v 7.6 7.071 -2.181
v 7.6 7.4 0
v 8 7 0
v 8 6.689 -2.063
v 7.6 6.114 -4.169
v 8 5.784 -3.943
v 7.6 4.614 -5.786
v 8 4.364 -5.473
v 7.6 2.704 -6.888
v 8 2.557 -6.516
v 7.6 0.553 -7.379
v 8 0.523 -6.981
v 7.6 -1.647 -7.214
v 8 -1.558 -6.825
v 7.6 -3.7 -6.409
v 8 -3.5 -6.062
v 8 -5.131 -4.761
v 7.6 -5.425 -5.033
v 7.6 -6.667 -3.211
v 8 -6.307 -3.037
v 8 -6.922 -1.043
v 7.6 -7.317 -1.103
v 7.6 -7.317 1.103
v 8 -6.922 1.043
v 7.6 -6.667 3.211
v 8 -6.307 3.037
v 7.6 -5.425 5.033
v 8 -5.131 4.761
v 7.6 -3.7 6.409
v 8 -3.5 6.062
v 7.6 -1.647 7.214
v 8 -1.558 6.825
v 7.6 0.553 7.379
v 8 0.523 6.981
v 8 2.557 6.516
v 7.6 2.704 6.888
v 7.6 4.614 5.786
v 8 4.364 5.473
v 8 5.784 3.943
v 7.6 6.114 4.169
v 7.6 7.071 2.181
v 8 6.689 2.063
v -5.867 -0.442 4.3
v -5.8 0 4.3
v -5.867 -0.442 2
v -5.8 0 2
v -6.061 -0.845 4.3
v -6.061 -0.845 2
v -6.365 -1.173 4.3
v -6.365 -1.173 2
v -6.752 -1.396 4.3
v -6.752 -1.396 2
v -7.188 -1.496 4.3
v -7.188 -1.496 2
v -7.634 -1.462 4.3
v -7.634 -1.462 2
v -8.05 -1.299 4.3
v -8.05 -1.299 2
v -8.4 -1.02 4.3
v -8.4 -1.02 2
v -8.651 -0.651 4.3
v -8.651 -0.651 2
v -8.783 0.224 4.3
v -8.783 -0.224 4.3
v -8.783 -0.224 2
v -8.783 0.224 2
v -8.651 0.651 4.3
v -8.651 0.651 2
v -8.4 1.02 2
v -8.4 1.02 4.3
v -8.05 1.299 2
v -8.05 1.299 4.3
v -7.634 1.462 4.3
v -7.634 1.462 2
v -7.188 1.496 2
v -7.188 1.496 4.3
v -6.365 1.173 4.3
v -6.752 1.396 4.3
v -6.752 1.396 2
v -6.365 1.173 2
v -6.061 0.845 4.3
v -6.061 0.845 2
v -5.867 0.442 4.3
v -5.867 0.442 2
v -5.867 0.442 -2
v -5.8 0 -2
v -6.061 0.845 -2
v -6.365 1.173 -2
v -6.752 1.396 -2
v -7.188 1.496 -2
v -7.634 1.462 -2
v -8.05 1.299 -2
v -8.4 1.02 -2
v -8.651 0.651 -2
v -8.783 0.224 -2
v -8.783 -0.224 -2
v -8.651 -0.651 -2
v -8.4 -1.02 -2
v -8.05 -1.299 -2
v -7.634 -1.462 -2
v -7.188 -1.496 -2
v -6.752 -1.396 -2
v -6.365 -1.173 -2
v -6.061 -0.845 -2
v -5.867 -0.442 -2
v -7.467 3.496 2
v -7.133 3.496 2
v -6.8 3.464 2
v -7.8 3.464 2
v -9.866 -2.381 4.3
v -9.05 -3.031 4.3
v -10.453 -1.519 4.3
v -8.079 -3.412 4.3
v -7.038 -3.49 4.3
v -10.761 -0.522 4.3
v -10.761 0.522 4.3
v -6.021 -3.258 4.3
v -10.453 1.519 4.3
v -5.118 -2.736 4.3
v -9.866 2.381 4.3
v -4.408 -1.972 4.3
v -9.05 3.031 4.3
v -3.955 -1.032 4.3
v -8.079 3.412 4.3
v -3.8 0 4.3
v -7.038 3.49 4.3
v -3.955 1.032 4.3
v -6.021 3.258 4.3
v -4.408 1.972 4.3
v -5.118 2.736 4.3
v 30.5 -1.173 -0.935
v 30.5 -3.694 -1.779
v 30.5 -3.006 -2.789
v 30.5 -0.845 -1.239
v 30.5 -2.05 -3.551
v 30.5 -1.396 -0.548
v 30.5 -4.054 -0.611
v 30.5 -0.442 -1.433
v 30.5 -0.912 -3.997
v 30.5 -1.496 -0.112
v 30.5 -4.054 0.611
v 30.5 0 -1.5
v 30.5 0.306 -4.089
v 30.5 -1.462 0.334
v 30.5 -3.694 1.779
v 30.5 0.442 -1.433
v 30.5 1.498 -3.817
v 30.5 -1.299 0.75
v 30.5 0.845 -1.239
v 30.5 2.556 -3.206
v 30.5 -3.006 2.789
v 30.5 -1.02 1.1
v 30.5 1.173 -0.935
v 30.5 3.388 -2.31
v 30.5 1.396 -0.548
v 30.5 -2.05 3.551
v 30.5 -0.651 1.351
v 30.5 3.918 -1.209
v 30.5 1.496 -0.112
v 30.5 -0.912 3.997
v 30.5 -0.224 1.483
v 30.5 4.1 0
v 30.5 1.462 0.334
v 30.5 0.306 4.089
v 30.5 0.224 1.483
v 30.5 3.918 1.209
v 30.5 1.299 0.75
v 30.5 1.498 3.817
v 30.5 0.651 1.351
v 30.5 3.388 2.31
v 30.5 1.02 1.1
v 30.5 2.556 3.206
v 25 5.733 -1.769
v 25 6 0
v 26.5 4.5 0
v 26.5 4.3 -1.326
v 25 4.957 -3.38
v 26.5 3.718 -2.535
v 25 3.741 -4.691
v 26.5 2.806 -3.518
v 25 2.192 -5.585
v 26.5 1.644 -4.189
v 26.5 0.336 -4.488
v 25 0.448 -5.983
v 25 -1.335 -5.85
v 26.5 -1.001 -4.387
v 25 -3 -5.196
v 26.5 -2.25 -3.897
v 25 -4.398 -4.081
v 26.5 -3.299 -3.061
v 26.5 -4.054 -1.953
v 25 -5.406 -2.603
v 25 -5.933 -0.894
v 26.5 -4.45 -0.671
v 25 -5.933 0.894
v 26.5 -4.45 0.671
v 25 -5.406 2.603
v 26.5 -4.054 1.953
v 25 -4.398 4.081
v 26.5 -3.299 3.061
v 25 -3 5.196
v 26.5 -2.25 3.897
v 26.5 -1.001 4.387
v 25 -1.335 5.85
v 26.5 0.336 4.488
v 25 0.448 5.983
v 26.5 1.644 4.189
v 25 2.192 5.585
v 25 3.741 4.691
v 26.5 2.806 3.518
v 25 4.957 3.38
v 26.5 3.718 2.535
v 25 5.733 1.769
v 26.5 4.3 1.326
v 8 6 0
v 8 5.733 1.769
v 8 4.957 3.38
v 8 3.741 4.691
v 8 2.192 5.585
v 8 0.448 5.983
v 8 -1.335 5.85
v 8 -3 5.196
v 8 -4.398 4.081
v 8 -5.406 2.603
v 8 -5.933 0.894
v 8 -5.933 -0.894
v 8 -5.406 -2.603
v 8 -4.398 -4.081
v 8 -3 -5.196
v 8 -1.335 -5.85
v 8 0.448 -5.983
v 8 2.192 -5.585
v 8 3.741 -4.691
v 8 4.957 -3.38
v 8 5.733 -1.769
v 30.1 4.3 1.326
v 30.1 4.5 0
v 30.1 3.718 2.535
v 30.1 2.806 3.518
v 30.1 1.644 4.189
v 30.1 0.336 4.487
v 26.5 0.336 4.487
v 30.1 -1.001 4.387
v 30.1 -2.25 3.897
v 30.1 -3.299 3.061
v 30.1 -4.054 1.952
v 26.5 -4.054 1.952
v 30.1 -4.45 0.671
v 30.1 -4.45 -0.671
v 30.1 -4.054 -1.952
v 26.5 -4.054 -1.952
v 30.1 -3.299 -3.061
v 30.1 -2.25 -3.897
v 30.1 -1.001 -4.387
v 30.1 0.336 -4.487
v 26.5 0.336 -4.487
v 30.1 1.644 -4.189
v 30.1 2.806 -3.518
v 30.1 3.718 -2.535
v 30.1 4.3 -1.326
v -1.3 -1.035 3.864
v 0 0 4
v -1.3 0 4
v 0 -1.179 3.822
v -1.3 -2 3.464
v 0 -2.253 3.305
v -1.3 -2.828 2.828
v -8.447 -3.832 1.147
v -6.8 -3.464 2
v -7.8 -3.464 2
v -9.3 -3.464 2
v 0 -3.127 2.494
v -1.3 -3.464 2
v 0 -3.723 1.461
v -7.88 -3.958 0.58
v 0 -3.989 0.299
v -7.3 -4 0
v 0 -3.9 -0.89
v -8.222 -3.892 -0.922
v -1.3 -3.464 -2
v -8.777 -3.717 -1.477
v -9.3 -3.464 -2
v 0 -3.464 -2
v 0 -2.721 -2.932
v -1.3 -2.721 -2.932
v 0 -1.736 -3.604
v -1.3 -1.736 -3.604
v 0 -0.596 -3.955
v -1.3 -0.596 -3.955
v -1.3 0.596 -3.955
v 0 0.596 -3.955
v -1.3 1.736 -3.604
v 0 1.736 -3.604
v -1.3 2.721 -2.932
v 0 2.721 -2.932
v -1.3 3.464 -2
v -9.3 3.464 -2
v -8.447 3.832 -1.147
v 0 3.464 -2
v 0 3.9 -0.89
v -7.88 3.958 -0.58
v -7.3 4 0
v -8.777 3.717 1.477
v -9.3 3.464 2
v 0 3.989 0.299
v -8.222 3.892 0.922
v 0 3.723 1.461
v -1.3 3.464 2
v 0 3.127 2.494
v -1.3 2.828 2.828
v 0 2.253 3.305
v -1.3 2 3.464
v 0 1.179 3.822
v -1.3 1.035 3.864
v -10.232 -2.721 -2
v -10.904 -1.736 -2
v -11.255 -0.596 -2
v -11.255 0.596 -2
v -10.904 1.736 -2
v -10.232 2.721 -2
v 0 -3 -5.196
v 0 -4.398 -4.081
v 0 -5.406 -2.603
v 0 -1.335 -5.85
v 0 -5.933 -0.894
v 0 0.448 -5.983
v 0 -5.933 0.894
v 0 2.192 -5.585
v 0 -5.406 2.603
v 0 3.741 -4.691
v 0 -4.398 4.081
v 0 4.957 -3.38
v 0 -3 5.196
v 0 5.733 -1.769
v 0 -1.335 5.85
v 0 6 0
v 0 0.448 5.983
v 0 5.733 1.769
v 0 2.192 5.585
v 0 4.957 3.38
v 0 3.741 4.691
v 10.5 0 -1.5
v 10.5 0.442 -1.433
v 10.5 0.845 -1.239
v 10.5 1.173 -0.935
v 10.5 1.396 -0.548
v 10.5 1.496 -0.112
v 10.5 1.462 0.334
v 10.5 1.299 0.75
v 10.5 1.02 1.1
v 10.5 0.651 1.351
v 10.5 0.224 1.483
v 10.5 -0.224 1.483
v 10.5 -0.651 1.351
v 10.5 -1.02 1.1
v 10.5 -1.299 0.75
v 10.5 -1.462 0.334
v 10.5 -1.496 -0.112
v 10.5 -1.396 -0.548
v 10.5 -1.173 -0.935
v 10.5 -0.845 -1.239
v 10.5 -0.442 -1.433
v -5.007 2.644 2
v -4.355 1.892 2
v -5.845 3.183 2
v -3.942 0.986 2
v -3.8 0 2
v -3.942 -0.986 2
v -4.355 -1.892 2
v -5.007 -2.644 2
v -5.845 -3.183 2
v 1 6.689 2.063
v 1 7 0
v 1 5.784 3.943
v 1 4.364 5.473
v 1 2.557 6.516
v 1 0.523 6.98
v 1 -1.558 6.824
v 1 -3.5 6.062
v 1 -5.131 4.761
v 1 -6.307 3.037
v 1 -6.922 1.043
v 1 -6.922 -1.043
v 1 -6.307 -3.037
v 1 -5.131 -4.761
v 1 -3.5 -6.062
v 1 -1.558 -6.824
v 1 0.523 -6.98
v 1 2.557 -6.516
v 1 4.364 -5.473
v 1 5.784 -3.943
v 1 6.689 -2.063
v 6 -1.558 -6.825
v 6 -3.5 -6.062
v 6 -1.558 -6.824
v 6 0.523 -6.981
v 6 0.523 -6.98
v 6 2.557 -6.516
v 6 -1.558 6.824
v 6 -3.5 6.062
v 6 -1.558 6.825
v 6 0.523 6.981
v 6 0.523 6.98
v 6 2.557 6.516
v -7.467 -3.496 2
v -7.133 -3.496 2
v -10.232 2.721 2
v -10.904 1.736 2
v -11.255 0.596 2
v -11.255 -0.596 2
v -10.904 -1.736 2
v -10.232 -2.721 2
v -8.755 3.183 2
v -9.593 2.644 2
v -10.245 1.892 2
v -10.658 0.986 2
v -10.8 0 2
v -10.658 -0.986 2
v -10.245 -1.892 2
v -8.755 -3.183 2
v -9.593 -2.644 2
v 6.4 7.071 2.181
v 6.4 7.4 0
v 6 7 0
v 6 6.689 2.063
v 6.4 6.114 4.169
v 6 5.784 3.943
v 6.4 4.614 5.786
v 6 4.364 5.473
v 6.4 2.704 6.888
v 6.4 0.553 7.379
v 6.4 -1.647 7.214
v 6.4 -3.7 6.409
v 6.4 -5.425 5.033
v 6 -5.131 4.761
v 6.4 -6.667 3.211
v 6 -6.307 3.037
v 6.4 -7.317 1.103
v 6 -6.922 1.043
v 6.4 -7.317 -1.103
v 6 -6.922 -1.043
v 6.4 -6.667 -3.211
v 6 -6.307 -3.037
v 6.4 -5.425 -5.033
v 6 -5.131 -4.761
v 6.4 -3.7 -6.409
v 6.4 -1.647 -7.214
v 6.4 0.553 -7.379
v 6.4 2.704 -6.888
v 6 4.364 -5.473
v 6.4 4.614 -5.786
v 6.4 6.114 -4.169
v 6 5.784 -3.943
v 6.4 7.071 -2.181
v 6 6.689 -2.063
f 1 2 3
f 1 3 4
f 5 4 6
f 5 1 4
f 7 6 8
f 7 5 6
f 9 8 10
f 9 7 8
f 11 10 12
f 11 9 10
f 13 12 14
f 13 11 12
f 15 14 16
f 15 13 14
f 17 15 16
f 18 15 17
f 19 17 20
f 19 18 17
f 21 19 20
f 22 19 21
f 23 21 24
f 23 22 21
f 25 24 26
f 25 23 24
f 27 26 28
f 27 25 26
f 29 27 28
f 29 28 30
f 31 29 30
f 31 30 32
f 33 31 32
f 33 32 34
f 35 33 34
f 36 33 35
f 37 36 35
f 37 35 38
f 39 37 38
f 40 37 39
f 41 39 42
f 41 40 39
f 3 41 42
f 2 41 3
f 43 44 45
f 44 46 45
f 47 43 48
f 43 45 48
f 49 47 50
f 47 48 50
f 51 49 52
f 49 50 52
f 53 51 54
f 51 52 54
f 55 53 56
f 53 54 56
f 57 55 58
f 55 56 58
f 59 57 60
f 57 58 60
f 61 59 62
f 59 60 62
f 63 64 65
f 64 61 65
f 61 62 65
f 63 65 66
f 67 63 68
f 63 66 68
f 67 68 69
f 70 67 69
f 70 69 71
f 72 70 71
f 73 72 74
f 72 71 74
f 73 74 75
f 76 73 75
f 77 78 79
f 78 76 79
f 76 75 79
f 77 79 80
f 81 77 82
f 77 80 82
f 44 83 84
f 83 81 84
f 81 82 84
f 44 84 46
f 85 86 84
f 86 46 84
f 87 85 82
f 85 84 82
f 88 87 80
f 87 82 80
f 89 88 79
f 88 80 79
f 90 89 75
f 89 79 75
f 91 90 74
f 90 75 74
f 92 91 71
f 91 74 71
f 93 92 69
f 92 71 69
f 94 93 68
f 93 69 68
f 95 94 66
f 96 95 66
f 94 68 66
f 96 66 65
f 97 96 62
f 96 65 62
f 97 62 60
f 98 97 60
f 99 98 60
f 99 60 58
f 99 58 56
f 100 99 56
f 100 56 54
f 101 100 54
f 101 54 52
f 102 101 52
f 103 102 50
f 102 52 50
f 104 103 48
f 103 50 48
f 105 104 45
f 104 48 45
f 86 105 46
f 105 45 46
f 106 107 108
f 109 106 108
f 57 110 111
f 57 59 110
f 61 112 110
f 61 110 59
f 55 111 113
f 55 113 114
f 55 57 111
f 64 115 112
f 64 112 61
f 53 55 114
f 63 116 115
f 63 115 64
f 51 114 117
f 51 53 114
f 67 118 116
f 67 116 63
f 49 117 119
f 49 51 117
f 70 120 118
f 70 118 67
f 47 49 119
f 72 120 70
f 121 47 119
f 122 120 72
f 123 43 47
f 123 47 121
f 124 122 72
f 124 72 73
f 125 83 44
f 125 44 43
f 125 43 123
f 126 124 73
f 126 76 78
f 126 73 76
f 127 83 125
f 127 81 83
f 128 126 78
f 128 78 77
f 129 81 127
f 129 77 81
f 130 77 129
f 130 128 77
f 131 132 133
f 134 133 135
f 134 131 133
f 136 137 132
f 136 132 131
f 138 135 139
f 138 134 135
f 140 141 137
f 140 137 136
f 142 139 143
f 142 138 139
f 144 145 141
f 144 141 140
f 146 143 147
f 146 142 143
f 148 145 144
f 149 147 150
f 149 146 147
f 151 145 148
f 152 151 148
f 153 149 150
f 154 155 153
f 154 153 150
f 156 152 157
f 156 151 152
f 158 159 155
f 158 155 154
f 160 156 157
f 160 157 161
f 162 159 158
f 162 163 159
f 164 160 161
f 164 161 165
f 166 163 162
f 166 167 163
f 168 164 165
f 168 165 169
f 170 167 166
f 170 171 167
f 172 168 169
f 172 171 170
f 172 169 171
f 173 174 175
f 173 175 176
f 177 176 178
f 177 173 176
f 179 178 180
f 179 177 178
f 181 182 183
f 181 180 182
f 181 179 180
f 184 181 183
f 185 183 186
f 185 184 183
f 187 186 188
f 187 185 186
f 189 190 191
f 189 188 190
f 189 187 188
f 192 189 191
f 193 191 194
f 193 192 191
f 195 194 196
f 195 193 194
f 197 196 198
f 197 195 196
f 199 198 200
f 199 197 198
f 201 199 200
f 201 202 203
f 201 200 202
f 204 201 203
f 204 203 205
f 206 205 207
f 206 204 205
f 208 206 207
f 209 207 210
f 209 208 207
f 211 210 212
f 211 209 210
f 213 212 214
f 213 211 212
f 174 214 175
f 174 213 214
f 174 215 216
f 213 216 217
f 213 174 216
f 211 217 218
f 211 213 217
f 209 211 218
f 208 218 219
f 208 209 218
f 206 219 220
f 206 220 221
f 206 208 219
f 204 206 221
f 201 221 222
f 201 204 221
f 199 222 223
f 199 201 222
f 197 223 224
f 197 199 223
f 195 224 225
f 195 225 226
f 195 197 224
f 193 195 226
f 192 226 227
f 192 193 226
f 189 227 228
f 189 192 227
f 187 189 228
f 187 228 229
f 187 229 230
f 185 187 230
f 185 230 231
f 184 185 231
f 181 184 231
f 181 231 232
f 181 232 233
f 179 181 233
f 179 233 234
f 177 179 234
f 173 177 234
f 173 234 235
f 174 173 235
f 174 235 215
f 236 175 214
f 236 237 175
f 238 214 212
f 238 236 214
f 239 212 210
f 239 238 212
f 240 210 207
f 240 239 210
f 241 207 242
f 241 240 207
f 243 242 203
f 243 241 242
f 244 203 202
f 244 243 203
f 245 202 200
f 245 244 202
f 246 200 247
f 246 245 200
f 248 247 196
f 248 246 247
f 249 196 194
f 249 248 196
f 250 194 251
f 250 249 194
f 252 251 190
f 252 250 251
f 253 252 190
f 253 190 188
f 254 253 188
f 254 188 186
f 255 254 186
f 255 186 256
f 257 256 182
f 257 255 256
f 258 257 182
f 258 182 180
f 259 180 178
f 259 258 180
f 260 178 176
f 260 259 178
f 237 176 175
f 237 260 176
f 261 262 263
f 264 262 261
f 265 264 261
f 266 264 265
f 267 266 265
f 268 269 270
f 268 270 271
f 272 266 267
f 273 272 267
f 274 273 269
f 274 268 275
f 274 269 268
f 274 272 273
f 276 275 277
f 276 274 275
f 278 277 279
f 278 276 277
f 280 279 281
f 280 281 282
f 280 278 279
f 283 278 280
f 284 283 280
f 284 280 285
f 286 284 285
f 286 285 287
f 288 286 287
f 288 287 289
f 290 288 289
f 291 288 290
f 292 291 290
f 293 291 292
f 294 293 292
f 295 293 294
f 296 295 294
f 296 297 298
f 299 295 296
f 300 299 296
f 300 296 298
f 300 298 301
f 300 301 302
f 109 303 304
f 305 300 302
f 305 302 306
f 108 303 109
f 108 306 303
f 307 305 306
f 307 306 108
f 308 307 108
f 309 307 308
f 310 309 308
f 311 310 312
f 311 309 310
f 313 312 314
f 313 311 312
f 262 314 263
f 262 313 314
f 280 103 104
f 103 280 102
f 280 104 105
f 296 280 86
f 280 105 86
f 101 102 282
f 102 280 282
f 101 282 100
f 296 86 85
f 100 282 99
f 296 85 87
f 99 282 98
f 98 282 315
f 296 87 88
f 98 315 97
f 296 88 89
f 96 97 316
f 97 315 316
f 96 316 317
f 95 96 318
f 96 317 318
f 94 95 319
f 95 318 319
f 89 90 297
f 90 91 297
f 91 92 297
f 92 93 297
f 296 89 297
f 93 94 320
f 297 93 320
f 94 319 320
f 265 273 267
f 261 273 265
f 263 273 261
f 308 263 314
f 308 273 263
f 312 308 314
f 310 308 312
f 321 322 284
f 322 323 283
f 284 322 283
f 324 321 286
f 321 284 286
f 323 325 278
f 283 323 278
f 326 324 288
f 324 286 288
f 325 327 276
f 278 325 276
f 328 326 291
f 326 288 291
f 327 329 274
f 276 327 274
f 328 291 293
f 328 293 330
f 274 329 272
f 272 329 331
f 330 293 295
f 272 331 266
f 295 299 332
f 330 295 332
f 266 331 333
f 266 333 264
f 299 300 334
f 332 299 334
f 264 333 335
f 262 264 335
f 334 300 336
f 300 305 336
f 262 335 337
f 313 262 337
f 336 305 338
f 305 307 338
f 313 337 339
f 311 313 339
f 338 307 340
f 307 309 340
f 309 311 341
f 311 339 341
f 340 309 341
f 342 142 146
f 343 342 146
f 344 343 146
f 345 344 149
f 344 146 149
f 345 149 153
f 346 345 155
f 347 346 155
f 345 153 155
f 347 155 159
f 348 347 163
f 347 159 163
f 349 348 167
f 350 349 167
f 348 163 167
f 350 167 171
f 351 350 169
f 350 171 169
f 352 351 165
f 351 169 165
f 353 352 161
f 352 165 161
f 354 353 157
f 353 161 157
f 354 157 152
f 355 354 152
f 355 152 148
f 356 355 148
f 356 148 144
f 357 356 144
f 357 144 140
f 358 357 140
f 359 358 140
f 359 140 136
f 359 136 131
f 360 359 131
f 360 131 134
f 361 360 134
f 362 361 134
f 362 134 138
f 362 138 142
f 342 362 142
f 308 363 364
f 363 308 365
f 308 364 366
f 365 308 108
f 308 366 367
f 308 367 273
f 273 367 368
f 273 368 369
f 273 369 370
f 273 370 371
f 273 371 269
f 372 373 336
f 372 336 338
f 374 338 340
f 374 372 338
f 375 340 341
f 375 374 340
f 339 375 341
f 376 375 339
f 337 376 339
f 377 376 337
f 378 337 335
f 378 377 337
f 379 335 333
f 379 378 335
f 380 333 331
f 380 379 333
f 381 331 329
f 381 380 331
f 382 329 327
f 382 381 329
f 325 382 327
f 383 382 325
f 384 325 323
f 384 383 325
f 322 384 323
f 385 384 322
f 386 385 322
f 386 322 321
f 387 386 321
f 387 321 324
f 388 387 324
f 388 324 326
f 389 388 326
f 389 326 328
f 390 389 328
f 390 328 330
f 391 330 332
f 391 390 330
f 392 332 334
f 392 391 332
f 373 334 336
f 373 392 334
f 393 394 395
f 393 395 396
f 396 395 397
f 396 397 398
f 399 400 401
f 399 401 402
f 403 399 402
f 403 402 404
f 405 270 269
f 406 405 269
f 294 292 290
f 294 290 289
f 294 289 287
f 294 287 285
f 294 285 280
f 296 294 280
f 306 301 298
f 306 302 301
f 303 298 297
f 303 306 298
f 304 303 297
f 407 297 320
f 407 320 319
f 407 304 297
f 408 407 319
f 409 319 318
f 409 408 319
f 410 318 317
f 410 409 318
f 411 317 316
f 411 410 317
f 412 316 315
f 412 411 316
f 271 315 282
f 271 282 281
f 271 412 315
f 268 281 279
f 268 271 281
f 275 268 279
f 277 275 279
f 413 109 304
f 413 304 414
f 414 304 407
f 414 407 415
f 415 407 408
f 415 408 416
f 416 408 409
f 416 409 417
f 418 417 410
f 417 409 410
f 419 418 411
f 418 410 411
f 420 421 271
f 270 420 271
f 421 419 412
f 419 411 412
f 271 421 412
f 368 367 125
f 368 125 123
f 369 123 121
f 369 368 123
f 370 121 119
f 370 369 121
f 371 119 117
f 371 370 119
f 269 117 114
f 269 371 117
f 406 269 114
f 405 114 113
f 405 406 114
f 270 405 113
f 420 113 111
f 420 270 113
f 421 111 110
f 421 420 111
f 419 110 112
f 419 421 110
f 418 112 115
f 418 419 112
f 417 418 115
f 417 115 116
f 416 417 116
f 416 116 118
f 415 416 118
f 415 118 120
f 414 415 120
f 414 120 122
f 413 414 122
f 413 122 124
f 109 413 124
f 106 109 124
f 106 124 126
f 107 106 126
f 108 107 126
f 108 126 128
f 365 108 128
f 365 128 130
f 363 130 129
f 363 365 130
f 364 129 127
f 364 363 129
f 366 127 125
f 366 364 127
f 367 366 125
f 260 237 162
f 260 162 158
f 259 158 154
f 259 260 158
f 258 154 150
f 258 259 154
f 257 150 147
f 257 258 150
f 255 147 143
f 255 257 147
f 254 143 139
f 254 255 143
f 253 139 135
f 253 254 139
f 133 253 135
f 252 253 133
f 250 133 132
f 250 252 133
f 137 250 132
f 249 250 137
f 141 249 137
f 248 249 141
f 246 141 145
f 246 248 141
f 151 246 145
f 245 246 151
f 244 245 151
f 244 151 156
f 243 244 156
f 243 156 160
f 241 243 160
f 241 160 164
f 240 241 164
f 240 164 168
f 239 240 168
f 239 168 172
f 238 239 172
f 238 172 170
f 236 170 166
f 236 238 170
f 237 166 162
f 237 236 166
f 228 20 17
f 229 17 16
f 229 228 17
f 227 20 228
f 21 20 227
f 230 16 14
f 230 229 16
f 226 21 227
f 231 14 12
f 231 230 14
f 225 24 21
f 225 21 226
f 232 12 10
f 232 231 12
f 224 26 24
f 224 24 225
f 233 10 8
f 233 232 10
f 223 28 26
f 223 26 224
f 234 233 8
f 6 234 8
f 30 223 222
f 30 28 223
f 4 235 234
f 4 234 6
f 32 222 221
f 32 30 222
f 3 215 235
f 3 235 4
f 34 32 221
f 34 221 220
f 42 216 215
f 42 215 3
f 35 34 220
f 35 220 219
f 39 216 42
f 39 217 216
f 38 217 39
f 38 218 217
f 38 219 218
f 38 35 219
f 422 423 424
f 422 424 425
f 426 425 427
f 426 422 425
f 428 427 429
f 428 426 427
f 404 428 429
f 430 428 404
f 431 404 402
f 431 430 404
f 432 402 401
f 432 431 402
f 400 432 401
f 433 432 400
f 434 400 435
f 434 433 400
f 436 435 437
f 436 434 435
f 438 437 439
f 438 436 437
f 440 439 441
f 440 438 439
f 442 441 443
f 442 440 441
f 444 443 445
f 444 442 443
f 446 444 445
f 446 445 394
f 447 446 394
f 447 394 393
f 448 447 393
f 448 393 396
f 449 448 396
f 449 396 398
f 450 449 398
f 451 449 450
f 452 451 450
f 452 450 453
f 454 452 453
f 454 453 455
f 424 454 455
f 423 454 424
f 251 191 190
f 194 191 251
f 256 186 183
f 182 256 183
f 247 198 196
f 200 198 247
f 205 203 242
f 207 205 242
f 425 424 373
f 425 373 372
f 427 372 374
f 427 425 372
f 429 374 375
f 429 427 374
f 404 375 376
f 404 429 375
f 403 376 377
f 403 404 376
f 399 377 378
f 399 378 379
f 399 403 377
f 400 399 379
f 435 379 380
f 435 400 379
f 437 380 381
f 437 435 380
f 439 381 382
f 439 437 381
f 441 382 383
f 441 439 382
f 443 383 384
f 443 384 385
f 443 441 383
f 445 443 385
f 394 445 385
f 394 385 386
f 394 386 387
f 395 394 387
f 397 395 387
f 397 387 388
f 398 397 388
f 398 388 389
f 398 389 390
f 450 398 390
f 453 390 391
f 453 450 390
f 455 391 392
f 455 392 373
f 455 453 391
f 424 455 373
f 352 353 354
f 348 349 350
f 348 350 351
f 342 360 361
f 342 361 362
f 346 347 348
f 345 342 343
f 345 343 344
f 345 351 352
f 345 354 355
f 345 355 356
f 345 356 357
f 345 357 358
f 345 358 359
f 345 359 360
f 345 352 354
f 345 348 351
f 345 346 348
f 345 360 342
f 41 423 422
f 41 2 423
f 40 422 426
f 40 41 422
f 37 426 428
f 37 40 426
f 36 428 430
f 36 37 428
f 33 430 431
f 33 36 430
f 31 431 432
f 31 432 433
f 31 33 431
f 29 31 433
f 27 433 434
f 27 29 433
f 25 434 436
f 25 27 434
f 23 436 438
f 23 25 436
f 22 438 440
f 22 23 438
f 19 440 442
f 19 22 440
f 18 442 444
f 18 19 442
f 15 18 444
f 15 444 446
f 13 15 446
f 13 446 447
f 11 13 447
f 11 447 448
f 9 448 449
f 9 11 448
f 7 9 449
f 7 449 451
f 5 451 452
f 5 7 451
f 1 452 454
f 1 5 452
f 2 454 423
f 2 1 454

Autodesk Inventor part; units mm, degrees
ref_plane "YZ Plane" through (0, 0, 0) normal (1, 0, 0) x (0, 1, 0)
ref_plane "XZ Plane" through (0, 0, 0) normal (0, 1, 0) x (-1, 0, 0)
ref_plane "XY Plane" through (0, 0, 0) normal (0, 0, 1) x (1, 0, 0)
sketch "Sketch2" plane through (0, 0, 0) normal (0, 0, 1) x (1, 0, 0)
  line L0 (-6.1, 0) -> (36.6, 0) construction
  line L1 (0, -1.48) -> (0, 8.88) construction
  line L2 (0, 0) -> (0, 7)
  line L3 (0, 7) -> (6, 7)
  line L4 (6, 7) -> (6, 7.4)
  line L5 (6, 7.4) -> (8, 7.4)
  line L6 (8, 7.4) -> (8, 6)
  line L7 (8, 6) -> (26.5, 6)
  line L8 (26.5, 6) -> (26.5, 4.5)
  line L9 (26.5, 4.5) -> (30.5, 4.5)
  line L10 (30.5, 4.5) -> (30.5, 0)
  line L11 (0, 0) -> (30.5, 0)
  dimension "d0" = 14
  dimension "d1" = 30.5
  dimension "d2" = 8
  dimension "d3" = 14.8
  dimension "d4" = 9
  dimension "d5" = 4
  dimension "d6" = 12
  dimension "d7" = 6
revolve "Revolution1" add sketch "Sketch2" angle 360 about axis through (-10, 0, 0) along (1, 0, 0)
thread "Thread1" size "M12x1" class "6g" standard "ISO Metric profile" length 110
chamfer "Chamfer1" distance 1.5 angle 45 1 edges at (26.5, -6, 0)
chamfer "Chamfer2" distance 0.4 angle 45 3 edges at (6, -7.4, 0) (8, -7.4, 0) (30.5, -4.5, 0)
chamfer "Chamfer3" distance 1 angle 45 1 edges at (0, -7, 0)
sketch "Sketch3" plane through (0, 0, 0) normal (-1, 0, 0) x (0, 0, 1)
  circle A0 centre (0, 0) radius 4
  dimension "d20" = 8
extrude "Extrusion1" add sketch "Sketch3" along normal blind 11.3
sketch "Sketch4" plane through (-11.3, 0, 0) normal (-1, 0, 0) x (0, 0, 1)
  line L0 (0, -10.36) -> (0, 10.36) construction
  circle A0 centre (0, 0) radius 4 construction
  circle A1 centre (0, 0) radius 4
  line L1 (-2, -3.4641) -> (-2, 3.4641)
  line L2 (2, 3.4641) -> (2, -3.4641)
  dimension "d23" = 4
extrude "Extrusion2" cut sketch "Sketch4" against normal blind 10 contours A1 L2 | L1 A1
sketch "Sketch5" plane through (-11.3, -3.4641, 2) normal (0, 0, 1) x (1, 0, 0)
  line L0 (-8.36, 3.4641) -> (50.16, 3.4641) construction
  circle A0 centre (4, 3.4641) radius 4
  line L1 (0, 0) -> (0, 6.9282) construction
  line L2 (10, 0) -> (0, 0) construction
  line L3 (10, 0) -> (10, 6.9282) construction
  line L4 (0, 6.9282) -> (10, 6.9282) construction
  line L5 (0, 0) -> (0, 6.9282) construction
  line L6 (11.3, 7.4641) -> (0, 7.4641) construction
  line L7 (11.3, -0.5359) -> (0, -0.5359) construction
  line L8 (4, -0.5359) -> (0, -0.5359)
  line L9 (0, -0.5359) -> (0, 7.4641)
  line L10 (0, 7.4641) -> (4, 7.4641)
  point P0 (11.3, 3.4641)
  point P1 (0, 3.4641)
  dimension "d26" = 8
extrude "Extrusion3" cut sketch "Sketch5" against normal through all contours A0 L9 L10 | L8 L9 A0
sketch "Sketch6" plane through (-1.3, -3.4641, 2) normal (0, 0, 1) x (1, 0, 0)
  arc A0 (-8, 6.9282) -> (-8, 0) centre (-6, 3.4641) ccw construction
  circle A1 centre (-6, 3.4641) radius 1.5
  point P0 (1.3, 3.4641)
  dimension "d29" = 3
extrude "Extrusion4" cut sketch "Sketch6" against normal through all
sketch "Sketch7" plane through (-1.3, -3.4641, 2) normal (0, 0, 1) x (1, 0, 0)
  circle A0 centre (-6, 3.4641) radius 1.5 construction
  circle A1 centre (-6, 3.4641) radius 1.5
  circle A2 centre (-6, 3.4641) radius 3.5
  point P0 (1.3, 3.4641)
  dimension "d32" = 7
extrude "Extrusion5" add sketch "Sketch7" along normal blind 2.3
sketch "Sketch8" plane through (30.5, 0, 0) normal (1, 0, 0) x (0, 0, -1)
  circle A0 centre (0, 0) radius 1.5
  dimension "d35" = 3
extrude "Extrusion6" cut sketch "Sketch8" against normal blind 20
properties part number "Corps" material "Aluminum 6061"
